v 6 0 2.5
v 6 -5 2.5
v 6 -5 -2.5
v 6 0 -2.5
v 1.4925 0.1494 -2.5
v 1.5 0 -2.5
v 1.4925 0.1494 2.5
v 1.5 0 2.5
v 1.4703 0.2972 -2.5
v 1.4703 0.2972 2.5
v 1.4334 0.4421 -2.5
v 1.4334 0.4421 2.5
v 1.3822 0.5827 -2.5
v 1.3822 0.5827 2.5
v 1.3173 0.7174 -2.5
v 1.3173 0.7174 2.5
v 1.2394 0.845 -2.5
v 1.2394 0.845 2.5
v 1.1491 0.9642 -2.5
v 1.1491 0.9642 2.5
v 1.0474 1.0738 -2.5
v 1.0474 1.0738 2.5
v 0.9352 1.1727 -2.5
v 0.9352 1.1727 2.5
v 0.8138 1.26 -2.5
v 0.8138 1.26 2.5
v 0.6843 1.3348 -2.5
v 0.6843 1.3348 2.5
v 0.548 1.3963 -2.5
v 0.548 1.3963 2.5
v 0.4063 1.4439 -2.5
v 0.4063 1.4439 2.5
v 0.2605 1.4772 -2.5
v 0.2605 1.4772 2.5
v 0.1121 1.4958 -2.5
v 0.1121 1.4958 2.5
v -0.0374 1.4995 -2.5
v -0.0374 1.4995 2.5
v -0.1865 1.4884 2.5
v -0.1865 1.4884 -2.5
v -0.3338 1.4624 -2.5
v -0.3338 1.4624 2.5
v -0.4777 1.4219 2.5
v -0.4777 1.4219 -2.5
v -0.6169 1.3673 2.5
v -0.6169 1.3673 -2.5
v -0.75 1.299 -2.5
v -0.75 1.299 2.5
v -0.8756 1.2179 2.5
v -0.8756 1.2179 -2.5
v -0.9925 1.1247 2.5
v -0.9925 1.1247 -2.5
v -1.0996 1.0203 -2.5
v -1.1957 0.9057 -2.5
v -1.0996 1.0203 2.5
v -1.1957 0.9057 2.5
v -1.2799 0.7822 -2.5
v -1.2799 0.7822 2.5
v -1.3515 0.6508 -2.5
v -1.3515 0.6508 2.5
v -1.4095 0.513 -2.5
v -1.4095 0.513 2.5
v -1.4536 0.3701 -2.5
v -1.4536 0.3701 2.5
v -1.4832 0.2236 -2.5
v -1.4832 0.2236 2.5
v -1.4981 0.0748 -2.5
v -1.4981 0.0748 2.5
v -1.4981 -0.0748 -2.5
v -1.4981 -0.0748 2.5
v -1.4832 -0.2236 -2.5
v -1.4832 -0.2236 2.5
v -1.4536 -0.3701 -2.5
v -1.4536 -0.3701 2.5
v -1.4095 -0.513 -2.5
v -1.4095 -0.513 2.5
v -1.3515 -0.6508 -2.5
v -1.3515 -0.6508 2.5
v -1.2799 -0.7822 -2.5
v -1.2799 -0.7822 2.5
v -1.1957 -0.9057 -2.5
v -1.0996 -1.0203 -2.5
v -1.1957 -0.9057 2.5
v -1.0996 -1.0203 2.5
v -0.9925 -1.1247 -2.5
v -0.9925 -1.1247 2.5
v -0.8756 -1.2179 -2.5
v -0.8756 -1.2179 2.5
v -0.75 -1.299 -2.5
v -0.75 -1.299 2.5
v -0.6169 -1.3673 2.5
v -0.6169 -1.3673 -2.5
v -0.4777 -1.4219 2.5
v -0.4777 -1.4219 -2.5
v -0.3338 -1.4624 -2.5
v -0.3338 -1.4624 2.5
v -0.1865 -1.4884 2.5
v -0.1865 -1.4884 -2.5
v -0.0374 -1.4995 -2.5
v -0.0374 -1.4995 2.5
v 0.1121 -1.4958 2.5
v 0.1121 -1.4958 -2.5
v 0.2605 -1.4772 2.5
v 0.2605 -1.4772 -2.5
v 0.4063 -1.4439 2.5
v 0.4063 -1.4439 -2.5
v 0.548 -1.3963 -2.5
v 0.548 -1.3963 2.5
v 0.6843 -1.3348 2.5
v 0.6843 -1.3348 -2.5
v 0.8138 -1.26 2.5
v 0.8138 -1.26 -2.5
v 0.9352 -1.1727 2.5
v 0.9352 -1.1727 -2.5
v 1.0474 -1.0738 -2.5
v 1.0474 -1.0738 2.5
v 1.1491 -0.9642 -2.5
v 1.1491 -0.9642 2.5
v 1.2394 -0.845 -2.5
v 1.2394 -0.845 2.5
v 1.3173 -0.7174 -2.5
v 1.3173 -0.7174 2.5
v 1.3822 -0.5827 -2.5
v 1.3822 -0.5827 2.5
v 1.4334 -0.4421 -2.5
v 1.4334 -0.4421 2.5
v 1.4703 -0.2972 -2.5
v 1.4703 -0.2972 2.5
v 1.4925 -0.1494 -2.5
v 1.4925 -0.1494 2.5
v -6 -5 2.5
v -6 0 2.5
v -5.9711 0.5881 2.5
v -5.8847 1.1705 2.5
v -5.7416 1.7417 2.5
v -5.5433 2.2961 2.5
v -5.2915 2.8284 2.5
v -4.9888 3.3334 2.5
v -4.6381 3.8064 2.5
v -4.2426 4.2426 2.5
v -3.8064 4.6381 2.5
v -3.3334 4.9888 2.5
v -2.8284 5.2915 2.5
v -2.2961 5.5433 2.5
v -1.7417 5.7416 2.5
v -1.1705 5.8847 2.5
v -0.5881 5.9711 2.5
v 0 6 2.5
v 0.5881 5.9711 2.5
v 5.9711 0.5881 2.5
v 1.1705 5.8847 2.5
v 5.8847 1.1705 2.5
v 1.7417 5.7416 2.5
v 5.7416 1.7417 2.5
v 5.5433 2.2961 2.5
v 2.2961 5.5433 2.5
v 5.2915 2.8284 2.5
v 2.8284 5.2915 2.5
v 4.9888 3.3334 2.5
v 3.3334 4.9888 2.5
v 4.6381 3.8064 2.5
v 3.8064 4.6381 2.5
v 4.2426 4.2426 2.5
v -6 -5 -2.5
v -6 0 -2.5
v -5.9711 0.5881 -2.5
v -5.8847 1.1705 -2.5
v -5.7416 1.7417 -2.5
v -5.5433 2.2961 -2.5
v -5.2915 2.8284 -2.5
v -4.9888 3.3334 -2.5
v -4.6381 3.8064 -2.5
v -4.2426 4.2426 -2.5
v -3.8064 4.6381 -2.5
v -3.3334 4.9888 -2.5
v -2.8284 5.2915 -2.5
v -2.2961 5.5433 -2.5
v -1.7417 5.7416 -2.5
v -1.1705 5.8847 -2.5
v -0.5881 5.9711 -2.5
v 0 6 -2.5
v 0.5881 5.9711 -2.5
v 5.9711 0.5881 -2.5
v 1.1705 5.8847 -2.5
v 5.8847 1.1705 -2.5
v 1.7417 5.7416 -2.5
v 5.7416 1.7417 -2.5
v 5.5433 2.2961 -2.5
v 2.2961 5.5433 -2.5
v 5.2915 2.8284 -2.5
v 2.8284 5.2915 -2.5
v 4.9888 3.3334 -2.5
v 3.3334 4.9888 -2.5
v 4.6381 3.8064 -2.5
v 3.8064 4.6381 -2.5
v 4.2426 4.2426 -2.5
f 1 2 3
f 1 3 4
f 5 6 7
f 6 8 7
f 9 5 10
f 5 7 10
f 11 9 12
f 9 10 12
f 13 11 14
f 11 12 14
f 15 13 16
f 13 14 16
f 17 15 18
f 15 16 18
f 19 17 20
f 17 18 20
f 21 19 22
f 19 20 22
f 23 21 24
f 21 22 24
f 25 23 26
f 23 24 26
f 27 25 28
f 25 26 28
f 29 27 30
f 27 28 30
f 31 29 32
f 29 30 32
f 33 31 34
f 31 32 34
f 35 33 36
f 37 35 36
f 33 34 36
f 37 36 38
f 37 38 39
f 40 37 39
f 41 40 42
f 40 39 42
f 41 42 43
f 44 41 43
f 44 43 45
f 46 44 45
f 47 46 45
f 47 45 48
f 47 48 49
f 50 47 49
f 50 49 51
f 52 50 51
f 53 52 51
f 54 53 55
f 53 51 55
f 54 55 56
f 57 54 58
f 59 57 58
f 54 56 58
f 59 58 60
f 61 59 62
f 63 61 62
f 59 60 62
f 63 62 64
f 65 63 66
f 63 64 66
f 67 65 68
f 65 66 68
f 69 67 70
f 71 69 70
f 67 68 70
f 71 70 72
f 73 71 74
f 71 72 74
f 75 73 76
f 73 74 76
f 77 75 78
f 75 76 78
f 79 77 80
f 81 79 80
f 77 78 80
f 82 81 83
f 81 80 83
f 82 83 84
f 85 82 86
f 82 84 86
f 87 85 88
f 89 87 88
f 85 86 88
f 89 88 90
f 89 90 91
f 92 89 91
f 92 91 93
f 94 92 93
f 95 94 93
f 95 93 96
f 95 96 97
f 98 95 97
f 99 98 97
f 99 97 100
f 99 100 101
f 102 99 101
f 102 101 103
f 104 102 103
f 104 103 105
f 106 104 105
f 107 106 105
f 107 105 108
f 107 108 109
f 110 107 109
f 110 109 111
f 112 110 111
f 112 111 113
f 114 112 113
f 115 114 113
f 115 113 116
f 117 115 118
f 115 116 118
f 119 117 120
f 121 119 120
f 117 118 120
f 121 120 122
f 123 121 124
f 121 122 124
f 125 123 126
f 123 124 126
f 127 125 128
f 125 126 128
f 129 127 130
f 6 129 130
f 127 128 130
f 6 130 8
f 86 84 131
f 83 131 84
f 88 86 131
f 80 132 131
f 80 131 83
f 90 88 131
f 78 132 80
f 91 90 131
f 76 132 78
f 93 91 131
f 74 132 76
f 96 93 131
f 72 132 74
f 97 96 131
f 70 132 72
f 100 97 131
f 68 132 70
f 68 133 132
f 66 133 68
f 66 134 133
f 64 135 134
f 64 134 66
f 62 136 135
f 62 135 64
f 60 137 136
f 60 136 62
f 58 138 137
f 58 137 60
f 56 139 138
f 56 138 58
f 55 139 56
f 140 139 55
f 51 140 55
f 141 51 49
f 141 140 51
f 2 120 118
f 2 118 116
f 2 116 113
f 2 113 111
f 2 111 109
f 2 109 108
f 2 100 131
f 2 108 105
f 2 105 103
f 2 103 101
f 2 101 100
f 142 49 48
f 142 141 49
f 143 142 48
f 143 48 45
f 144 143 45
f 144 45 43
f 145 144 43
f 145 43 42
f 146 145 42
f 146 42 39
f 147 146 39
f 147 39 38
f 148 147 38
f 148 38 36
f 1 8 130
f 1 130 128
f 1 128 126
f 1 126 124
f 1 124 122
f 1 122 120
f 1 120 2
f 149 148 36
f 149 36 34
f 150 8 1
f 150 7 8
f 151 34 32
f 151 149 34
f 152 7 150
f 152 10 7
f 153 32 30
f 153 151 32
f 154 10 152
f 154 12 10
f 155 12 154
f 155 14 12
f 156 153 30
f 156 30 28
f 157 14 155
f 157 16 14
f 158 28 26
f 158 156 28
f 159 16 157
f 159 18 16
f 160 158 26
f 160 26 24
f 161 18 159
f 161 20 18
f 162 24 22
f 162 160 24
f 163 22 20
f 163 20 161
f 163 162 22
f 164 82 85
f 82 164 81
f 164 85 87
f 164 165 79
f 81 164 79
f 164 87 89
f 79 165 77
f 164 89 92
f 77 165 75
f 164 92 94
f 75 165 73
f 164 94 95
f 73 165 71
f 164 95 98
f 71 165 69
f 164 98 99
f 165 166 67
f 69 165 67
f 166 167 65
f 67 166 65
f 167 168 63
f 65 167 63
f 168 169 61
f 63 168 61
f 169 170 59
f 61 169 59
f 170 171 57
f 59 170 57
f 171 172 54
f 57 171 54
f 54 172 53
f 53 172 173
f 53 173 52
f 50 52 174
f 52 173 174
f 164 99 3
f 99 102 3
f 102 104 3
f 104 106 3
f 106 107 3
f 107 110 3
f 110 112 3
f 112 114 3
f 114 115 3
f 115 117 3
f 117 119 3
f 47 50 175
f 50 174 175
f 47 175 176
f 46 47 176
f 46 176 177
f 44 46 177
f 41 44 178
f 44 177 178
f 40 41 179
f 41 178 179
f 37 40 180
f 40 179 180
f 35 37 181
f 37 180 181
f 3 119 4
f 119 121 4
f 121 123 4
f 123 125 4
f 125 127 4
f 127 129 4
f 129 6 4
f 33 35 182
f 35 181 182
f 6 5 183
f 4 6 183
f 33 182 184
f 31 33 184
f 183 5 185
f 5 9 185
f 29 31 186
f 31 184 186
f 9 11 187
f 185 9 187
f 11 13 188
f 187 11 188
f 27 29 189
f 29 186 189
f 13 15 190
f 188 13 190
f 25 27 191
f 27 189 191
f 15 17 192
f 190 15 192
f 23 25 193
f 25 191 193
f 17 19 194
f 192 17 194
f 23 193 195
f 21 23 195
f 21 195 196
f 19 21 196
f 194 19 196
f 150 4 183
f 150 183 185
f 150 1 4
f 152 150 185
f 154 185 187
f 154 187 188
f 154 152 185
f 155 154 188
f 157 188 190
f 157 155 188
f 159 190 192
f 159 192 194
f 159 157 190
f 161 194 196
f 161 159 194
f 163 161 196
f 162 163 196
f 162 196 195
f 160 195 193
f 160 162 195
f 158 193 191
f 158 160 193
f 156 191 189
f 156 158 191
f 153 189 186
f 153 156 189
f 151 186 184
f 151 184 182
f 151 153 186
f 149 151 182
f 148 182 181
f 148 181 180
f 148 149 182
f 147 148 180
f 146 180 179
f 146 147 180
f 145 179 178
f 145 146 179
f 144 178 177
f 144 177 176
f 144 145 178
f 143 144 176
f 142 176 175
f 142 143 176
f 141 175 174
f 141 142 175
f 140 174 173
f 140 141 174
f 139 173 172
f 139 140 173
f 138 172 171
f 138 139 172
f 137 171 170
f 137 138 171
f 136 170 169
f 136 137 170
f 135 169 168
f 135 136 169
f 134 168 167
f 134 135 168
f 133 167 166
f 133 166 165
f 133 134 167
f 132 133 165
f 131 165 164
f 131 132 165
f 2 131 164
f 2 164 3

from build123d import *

# Parameters (mm, degrees)
BOSS_EXTRUDE1_DEPTH     = 2.5
SKETCH4_R               = 1.5
CUT_EXTRUDE1_DEPTH      = 3.5
CUT_EXTRUDE1_DEPTH_BACK = 3.5


with BuildPart() as part:
    # Sketch2 → Boss-Extrude1 (new body, symmetric)
    with BuildSketch(Plane.XY):
        with BuildLine():
            Line((-6, 0), (-6, -5))
            Line((-6, -5), (6, -5))
            Line((6, -5), (6, 0))
            ThreePointArc((6, 0), (0, 6), (-6, 0))
        make_face()
    extrude(amount=BOSS_EXTRUDE1_DEPTH, both=True)

    # Sketch4 → Cut-Extrude1 (cut, two sides)
    with BuildSketch(Plane.XY) as cut_extrude1_sk:
        Circle(SKETCH4_R)
    extrude(amount=CUT_EXTRUDE1_DEPTH, mode=Mode.SUBTRACT)
    extrude(cut_extrude1_sk.sketch, amount=-CUT_EXTRUDE1_DEPTH_BACK, mode=Mode.SUBTRACT)


solid = part.part
